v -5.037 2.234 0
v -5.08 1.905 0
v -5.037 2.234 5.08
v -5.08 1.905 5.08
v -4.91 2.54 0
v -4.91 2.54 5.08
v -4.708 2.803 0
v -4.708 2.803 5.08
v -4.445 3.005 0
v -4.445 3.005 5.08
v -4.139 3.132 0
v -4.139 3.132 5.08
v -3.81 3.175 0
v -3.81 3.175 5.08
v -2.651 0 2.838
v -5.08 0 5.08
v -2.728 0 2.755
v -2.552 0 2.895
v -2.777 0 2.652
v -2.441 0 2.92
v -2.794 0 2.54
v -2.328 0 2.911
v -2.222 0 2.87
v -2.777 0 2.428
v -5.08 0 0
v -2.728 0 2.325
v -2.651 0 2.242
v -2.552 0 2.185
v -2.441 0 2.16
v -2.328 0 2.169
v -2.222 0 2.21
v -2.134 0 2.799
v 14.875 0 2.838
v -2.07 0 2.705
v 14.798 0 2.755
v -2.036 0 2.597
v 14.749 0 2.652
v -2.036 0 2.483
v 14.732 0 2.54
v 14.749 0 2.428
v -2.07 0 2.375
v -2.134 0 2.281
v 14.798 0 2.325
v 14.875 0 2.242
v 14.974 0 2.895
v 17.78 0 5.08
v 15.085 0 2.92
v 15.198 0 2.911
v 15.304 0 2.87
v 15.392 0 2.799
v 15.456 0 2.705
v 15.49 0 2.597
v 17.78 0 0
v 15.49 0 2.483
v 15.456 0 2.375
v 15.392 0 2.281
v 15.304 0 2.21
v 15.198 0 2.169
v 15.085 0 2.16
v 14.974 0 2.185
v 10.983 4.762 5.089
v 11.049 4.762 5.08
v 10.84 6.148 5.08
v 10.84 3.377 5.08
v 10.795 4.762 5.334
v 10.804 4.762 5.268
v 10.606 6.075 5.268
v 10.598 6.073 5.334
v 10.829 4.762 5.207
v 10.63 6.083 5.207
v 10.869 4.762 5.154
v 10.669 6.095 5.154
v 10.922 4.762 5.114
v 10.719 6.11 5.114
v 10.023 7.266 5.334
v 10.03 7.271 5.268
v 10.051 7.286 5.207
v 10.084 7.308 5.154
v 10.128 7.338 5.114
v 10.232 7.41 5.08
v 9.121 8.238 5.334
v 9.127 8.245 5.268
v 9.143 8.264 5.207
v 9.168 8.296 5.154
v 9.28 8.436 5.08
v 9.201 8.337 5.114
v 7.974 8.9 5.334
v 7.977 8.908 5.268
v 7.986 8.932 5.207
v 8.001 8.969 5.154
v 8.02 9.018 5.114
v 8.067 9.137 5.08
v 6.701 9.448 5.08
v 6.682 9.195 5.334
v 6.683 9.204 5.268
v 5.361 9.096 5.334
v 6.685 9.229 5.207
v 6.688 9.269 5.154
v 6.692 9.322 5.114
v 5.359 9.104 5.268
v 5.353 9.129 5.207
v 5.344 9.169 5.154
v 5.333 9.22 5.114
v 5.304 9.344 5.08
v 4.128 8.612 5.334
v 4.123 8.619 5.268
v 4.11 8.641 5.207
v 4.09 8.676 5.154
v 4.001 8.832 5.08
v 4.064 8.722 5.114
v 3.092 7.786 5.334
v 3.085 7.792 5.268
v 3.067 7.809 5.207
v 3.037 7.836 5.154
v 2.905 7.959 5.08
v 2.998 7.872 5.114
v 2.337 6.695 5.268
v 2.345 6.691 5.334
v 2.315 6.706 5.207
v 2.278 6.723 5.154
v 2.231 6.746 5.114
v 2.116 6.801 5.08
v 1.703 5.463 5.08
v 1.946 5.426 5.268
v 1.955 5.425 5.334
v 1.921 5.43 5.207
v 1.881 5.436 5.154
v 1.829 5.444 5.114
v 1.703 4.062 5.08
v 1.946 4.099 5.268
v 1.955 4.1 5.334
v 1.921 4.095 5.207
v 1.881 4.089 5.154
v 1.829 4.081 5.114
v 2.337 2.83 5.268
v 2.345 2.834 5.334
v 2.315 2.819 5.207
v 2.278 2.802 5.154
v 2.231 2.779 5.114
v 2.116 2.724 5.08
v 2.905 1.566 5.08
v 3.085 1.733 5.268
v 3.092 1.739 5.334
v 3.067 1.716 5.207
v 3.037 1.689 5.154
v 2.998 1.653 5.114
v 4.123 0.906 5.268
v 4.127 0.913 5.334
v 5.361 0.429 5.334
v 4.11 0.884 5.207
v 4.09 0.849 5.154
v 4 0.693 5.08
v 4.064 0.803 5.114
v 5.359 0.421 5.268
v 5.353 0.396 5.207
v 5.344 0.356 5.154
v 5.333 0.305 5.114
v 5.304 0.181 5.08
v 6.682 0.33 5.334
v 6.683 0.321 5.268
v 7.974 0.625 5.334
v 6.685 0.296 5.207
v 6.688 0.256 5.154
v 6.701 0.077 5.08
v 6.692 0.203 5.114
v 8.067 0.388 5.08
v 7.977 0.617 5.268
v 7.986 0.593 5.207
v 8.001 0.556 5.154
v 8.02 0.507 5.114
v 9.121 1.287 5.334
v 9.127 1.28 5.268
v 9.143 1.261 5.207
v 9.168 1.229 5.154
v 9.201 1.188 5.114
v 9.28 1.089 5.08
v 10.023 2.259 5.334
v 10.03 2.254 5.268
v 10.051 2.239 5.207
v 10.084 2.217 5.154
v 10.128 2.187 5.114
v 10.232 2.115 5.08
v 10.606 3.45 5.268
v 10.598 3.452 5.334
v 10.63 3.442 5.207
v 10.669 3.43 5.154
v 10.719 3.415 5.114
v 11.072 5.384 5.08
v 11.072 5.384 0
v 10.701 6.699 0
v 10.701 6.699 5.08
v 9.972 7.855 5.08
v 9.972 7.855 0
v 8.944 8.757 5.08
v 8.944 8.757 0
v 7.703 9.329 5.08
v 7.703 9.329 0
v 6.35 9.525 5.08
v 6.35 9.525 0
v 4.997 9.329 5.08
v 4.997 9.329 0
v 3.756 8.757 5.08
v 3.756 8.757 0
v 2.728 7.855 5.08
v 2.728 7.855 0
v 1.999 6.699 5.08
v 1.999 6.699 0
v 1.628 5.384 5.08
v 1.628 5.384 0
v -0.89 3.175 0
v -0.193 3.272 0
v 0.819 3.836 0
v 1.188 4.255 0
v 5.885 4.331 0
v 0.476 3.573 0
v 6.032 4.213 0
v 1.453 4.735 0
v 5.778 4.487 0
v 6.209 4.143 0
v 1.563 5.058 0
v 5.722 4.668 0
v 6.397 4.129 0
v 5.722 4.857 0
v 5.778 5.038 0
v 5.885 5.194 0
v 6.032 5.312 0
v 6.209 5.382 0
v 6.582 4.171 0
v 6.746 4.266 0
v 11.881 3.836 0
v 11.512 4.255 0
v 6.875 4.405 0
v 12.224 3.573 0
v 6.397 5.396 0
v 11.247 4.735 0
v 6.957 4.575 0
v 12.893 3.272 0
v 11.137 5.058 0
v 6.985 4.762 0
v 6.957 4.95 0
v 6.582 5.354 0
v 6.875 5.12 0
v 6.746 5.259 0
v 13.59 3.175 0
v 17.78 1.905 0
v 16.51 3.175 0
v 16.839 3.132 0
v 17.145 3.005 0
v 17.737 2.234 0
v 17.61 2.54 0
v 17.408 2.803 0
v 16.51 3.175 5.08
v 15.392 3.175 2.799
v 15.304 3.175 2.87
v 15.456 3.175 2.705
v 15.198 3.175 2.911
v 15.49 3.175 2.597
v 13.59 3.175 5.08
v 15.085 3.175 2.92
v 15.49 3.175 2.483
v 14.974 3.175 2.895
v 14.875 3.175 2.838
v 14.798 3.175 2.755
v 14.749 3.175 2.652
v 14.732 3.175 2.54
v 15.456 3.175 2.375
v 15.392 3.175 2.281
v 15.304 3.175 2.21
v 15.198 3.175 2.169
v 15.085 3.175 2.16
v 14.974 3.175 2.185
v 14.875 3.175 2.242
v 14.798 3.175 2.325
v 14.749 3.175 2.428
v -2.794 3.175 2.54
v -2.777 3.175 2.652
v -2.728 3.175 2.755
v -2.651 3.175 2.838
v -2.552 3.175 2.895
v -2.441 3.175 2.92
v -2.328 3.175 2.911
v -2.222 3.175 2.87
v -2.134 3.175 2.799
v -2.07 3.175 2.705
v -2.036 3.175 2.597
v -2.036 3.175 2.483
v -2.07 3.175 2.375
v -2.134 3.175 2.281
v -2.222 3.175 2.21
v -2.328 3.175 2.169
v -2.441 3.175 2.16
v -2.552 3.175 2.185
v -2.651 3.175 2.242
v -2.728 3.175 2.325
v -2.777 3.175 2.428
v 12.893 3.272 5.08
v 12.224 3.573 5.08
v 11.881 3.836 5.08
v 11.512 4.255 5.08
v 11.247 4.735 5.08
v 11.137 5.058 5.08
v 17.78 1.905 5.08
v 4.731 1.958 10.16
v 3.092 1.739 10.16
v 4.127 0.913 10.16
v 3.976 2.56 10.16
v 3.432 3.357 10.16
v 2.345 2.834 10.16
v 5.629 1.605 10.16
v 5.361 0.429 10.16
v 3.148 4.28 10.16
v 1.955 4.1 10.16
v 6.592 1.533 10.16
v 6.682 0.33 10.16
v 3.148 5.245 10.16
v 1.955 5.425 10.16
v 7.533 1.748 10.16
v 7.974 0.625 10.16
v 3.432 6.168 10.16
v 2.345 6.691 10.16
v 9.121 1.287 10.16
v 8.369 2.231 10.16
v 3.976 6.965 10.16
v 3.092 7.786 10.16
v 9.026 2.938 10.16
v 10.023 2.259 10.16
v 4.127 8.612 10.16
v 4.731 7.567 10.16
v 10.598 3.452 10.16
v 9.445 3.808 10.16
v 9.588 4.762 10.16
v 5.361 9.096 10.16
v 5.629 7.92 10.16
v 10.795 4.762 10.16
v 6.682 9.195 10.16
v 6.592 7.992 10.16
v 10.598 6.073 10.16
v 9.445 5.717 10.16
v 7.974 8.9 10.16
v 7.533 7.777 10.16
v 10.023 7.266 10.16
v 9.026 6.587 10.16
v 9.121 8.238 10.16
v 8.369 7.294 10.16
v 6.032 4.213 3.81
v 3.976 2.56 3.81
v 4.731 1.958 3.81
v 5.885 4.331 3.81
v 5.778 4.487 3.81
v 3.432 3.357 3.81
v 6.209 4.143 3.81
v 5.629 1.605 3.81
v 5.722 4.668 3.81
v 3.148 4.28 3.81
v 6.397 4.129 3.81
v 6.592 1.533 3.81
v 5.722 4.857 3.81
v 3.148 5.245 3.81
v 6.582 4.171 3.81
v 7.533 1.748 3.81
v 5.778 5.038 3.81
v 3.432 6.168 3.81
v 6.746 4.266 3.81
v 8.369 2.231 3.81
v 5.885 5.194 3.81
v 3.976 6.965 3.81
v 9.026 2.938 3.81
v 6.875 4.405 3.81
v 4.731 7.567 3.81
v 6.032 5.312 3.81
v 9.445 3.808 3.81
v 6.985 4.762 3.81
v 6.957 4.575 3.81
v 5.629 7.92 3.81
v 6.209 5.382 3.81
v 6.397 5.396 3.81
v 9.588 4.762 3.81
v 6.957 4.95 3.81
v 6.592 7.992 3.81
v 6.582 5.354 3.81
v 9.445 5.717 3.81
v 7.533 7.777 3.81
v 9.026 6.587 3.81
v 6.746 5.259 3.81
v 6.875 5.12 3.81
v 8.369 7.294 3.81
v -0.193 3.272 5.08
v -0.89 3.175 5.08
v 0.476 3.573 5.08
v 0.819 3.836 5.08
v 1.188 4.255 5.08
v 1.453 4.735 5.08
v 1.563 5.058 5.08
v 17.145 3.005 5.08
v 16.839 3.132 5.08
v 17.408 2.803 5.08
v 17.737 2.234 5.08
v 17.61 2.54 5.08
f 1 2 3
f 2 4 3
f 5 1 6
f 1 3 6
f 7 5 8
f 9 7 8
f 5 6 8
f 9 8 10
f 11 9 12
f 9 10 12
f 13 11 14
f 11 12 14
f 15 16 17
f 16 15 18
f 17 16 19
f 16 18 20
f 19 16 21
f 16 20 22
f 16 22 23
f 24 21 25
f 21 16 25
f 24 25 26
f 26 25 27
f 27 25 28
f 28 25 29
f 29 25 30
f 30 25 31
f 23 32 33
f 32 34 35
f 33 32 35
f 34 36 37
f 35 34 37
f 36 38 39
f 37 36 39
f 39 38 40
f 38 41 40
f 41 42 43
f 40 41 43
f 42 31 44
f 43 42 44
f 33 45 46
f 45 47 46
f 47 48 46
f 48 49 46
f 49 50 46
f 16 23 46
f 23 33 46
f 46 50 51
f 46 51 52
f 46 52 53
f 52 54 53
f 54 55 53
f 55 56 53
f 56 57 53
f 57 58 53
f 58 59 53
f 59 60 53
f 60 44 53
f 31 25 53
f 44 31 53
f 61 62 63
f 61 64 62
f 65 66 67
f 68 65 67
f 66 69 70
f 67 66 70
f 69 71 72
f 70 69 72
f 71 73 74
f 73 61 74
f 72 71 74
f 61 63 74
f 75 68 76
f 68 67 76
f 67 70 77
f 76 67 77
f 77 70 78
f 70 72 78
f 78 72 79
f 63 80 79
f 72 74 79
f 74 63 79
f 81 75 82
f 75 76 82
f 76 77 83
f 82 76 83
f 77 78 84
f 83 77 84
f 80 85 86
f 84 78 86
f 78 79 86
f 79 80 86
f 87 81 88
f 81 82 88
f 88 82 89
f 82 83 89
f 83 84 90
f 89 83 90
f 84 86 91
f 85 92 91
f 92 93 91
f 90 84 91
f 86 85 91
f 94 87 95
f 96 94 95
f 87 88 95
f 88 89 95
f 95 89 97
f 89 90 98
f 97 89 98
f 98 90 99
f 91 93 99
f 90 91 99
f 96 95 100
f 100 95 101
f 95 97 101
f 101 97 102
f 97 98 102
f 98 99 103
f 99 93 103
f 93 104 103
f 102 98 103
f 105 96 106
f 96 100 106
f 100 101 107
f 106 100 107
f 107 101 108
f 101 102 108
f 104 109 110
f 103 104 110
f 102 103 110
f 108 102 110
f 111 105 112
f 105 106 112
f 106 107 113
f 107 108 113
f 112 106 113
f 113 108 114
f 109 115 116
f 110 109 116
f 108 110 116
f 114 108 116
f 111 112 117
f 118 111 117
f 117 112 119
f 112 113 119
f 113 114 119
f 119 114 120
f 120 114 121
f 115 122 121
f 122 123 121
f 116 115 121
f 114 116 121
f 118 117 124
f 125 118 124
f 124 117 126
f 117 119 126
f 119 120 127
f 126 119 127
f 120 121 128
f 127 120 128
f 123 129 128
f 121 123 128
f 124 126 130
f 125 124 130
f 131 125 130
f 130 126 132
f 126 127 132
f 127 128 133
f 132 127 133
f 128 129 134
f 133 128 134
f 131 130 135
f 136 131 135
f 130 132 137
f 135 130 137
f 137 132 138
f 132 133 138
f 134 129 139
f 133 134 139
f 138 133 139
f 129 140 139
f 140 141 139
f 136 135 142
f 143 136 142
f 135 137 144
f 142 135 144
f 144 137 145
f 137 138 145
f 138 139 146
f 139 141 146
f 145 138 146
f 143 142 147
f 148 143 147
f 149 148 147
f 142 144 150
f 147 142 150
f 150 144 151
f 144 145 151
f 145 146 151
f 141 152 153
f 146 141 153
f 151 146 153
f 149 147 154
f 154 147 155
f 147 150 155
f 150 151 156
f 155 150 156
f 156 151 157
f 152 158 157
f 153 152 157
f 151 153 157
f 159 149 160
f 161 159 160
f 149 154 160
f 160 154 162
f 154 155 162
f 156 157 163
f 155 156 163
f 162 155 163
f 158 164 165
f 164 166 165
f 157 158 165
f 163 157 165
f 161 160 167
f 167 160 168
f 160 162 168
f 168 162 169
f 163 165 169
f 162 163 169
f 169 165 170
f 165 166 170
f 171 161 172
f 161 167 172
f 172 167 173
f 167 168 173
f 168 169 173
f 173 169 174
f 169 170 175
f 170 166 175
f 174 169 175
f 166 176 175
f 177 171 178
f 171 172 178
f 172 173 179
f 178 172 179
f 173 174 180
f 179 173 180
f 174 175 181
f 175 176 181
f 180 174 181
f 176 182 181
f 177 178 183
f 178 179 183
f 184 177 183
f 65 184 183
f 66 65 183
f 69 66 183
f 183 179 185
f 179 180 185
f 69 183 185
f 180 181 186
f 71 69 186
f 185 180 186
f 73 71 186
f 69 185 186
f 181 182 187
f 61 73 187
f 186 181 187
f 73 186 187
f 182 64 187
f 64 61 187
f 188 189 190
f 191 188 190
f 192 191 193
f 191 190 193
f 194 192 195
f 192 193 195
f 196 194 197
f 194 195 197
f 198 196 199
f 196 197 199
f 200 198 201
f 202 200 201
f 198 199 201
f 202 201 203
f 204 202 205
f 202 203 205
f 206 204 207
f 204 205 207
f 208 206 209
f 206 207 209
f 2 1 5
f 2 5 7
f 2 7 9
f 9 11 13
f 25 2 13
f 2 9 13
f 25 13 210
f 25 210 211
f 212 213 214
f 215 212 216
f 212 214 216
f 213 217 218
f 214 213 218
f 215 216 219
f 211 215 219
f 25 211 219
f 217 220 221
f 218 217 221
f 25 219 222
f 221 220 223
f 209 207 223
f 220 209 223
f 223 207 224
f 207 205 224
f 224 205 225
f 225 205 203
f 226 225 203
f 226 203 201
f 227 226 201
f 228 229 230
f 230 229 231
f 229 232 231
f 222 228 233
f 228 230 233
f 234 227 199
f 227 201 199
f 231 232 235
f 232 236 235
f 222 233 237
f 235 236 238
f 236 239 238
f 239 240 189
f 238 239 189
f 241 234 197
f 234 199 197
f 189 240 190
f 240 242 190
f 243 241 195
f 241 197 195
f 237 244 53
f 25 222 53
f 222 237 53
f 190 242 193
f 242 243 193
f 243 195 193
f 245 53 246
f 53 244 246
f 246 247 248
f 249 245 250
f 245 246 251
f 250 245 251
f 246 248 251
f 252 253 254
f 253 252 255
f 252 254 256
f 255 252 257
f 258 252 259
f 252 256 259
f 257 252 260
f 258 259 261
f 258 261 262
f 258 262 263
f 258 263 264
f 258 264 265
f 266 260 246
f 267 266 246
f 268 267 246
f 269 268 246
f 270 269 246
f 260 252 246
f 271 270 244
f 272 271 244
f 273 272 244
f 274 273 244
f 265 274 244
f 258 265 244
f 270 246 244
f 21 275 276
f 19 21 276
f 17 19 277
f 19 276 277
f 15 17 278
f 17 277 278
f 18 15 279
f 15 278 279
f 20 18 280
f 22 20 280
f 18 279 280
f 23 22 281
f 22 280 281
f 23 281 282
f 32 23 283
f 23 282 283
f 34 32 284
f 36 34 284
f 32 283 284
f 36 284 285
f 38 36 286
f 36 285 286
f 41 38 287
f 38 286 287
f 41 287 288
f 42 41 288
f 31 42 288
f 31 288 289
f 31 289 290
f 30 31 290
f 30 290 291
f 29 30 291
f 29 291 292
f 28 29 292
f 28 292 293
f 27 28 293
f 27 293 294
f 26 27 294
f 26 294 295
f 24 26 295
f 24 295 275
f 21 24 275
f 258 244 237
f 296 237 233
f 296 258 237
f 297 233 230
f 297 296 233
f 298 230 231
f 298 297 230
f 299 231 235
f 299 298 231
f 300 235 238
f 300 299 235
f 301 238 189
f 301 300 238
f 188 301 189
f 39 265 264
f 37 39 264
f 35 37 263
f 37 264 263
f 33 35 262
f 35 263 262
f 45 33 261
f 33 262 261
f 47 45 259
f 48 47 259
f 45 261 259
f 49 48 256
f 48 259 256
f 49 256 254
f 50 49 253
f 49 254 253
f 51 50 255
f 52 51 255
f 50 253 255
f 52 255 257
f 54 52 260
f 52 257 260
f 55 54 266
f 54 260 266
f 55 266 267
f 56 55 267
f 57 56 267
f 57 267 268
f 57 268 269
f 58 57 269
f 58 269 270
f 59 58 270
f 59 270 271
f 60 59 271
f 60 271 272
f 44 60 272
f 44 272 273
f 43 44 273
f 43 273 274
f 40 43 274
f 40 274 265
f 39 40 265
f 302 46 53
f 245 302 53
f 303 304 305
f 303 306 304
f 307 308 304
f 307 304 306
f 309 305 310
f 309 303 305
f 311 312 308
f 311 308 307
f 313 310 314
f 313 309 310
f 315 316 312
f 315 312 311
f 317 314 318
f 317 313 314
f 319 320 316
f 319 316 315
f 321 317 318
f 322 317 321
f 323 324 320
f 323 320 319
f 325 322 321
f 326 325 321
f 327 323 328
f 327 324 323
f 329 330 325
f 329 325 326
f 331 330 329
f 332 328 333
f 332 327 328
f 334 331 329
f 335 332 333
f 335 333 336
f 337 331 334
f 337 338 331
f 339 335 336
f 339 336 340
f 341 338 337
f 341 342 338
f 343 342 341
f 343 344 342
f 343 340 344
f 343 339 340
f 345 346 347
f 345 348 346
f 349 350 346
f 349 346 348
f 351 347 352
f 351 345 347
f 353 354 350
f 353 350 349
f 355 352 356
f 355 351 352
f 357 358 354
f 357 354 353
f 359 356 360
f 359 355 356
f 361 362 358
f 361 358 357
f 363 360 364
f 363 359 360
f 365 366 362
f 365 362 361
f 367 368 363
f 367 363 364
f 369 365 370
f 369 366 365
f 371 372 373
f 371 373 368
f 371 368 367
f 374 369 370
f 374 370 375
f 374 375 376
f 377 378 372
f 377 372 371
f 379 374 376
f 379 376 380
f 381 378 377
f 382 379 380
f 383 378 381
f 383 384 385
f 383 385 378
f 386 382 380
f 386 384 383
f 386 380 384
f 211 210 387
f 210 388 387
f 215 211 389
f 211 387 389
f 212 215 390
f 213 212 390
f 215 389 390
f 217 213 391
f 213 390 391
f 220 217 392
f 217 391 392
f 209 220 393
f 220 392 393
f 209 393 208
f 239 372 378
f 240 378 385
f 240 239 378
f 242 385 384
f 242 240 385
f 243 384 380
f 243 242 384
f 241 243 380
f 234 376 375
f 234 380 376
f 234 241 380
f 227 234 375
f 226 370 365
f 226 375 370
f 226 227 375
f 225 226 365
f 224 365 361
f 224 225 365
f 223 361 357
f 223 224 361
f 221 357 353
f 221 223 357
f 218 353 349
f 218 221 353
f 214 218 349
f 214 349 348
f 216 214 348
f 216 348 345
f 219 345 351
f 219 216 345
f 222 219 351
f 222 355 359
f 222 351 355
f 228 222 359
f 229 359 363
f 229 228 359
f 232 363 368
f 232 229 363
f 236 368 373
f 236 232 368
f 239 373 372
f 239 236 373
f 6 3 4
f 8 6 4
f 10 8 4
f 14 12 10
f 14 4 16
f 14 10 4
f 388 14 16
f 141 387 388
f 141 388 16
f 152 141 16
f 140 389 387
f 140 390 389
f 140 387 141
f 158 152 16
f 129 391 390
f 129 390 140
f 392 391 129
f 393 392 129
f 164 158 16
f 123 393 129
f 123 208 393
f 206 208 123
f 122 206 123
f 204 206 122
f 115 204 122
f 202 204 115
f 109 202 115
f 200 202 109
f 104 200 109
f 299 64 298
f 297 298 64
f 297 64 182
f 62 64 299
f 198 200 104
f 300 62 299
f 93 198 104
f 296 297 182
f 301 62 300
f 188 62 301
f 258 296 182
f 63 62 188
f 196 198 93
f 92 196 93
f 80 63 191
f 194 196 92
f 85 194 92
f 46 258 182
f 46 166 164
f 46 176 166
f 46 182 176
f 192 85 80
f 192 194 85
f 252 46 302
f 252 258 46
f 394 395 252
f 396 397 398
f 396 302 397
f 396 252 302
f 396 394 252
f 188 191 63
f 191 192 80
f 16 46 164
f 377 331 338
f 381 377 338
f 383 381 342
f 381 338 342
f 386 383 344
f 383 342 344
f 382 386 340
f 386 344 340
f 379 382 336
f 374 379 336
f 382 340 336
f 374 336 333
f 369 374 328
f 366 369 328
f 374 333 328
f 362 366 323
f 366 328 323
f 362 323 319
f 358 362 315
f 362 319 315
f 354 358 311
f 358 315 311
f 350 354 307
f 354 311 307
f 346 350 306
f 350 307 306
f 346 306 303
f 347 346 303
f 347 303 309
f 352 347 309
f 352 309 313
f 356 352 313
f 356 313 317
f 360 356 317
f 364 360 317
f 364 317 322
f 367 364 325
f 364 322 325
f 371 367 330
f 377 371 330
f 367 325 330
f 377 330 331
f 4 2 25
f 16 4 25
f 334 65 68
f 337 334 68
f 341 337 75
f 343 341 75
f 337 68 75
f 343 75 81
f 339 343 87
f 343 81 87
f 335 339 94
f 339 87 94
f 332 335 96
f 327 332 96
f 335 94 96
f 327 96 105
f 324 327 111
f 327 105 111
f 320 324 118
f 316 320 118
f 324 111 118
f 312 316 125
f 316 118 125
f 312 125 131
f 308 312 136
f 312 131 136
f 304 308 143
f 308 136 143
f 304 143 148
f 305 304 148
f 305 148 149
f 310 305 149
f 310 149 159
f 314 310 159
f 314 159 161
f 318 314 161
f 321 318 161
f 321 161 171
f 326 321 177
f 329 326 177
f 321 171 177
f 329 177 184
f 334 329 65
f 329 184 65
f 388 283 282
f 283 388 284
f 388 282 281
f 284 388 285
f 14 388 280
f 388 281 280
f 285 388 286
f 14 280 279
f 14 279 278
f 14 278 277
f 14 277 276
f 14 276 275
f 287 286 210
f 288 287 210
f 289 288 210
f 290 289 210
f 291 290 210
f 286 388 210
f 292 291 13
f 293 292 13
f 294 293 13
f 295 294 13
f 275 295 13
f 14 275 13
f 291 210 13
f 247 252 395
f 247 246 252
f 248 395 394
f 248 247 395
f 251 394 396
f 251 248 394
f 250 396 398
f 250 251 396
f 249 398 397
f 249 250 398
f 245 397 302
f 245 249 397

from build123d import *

# Parameters (mm, degrees)
SKETCH1_R               = 0.635
BOSS_EXTRUDE1_DEPTH     = 5.08
SKETCH2_R               = 4.445
SKETCH2_R_2             = 0.635
BOSS_EXTRUDE2_DEPTH     = 5.08
SKETCH3_R               = 3.2385
CUT_EXTRUDE1_DEPTH      = 6.35
FILLET1_R               = 0.254
FILLET2_R               = 2.54
FILLET3_R               = 1.27
SKETCH5_R               = 0.381
CUT_EXTRUDE3_DEPTH      = 83.603101422
CUT_EXTRUDE4_DEPTH      = 83.603101422
CUT_EXTRUDE4_DEPTH_BACK = 83.603101422
SKETCH7_W               = 65.357576663
SKETCH7_H               = 10.612338137
FILLET4_R               = 1.27


with BuildPart() as part:
    # Sketch1 → Boss-Extrude1 (new body)
    with BuildSketch(Plane.XY):
        with BuildLine():
            Line((0, 0), (76.64958, 0))
            Line((76.64958, 0), (81.72958, 0))
            Line((81.72958, 0), (81.72958, 3.175))
            Line((81.72958, 3.175), (76.64958, 3.175))
            Line((76.64958, 3.175), (75.06208, 3.175))
            Line((75.06208, 3.175), (75.06208, 4.7625))
            ThreePointArc((75.06208, 4.7625), (70.29958, 9.525), (65.53708, 4.7625))
            Line((65.53708, 4.7625), (65.53708, 3.175))
            Line((65.53708, 3.175), (11.1125, 3.175))
            Line((11.1125, 3.175), (11.1125, 4.7625))
            ThreePointArc((11.1125, 4.7625), (6.35, 9.525), (1.5875, 4.7625))
            Line((1.5875, 4.7625), (1.5875, 3.175))
            Line((1.5875, 3.175), (0, 3.175))
            Line((0, 3.175), (-5.08, 3.175))
            Line((-5.08, 3.175), (-5.08, 0))
            Line((-5.08, 0), (0, 0))
        make_face()
        with Locations((6.35, 4.7625)):
            Circle(SKETCH1_R, mode=Mode.SUBTRACT)
        with Locations((70.29958, 4.7625)):
            Circle(SKETCH1_R, mode=Mode.SUBTRACT)
    extrude(amount=BOSS_EXTRUDE1_DEPTH)

    # Sketch2 → Boss-Extrude2 (add)
    # profile 1 of 2: a face of its own
    with BuildSketch(Plane.XY.offset(5.08)):
        with Locations((6.35, 4.7625)):
            Circle(SKETCH2_R)
        with Locations((6.35, 4.7625)):
            Circle(SKETCH2_R_2, mode=Mode.SUBTRACT)
    # profile 2 of 2: a face of its own
    with BuildSketch(Plane.XY.offset(5.08)):
        with Locations((70.29958, 4.7625)):
            Circle(SKETCH2_R)
        with Locations((70.29958, 4.7625)):
            Circle(SKETCH2_R_2, mode=Mode.SUBTRACT)
    extrude(amount=BOSS_EXTRUDE2_DEPTH)

    # Sketch3 → Cut-Extrude1 (cut)
    with BuildSketch(Plane.XY.offset(10.16)):
        with Locations((6.35, 4.7625)):
            Circle(SKETCH3_R)
        with Locations((70.29958, 4.7625)):
            Circle(SKETCH3_R)
    extrude(amount=-CUT_EXTRUDE1_DEPTH, mode=Mode.SUBTRACT)

    # Fillet1
    fillet1_edges = [part.edges().sort_by_distance(p)[0] for p in [
        (1.905, 4.7625, 5.08),
        (65.85458, 4.7625, 5.08),
    ]]
    fillet(fillet1_edges, radius=FILLET1_R)

    # Fillet2
    fillet2_edges = [part.edges().sort_by_distance(p)[0] for p in [
        (75.06208, 3.175, 2.54),
        (11.1125, 3.175, 2.54),
        (65.53708, 3.175, 2.54),
        (1.5875, 3.175, 2.54),
    ]]
    fillet(fillet2_edges, radius=FILLET2_R)

    # Fillet3
    fillet3_edges = [part.edges().sort_by_distance(p)[0] for p in [
        (-5.08, 3.175, 2.54),
        (81.72958, 3.175, 2.54),
    ]]
    fillet(fillet3_edges, radius=FILLET3_R)

    # Sketch5 → Cut-Extrude3 (cut, through all)
    with BuildSketch(Plane(origin=(0, 3.175, 0), x_dir=(1, 0, 0), z_dir=(0, 1, 0))):
        with Locations(Location((-2.413, -2.54, 0), (0, 0, 180))):
            Circle(SKETCH5_R)
        with Locations(Location((79.06258, -2.54, 0), (0, 0, 180))):
            Circle(SKETCH5_R)
        with Locations(Location((61.53658, -2.54, 0), (0, 0, 180))):
            Circle(SKETCH5_R)
        with Locations(Location((15.113, -2.54, 0), (0, 0, 180))):
            Circle(SKETCH5_R)
    extrude(amount=-CUT_EXTRUDE3_DEPTH, mode=Mode.SUBTRACT)

    # Sketch7 → Cut-Extrude4 (cut, two sides: drawn at the far end of the back side and taken through both)
    with BuildSketch(Plane(origin=(0, 3.175, 0), x_dir=(1, 0, 0), z_dir=(0, 1, 0)).offset(-CUT_EXTRUDE4_DEPTH_BACK)):
        with Locations((50.458788332, -5.306169069)):
            Rectangle(SKETCH7_W, SKETCH7_H)
    extrude(amount=CUT_EXTRUDE4_DEPTH + CUT_EXTRUDE4_DEPTH_BACK, mode=Mode.SUBTRACT)

    # Fillet4
    fillet4_edges = [part.edges().sort_by_distance(p)[0] for p in [
        (17.78, 3.175, 2.54),
    ]]
    fillet(fillet4_edges, radius=FILLET4_R)


solid = part.part
